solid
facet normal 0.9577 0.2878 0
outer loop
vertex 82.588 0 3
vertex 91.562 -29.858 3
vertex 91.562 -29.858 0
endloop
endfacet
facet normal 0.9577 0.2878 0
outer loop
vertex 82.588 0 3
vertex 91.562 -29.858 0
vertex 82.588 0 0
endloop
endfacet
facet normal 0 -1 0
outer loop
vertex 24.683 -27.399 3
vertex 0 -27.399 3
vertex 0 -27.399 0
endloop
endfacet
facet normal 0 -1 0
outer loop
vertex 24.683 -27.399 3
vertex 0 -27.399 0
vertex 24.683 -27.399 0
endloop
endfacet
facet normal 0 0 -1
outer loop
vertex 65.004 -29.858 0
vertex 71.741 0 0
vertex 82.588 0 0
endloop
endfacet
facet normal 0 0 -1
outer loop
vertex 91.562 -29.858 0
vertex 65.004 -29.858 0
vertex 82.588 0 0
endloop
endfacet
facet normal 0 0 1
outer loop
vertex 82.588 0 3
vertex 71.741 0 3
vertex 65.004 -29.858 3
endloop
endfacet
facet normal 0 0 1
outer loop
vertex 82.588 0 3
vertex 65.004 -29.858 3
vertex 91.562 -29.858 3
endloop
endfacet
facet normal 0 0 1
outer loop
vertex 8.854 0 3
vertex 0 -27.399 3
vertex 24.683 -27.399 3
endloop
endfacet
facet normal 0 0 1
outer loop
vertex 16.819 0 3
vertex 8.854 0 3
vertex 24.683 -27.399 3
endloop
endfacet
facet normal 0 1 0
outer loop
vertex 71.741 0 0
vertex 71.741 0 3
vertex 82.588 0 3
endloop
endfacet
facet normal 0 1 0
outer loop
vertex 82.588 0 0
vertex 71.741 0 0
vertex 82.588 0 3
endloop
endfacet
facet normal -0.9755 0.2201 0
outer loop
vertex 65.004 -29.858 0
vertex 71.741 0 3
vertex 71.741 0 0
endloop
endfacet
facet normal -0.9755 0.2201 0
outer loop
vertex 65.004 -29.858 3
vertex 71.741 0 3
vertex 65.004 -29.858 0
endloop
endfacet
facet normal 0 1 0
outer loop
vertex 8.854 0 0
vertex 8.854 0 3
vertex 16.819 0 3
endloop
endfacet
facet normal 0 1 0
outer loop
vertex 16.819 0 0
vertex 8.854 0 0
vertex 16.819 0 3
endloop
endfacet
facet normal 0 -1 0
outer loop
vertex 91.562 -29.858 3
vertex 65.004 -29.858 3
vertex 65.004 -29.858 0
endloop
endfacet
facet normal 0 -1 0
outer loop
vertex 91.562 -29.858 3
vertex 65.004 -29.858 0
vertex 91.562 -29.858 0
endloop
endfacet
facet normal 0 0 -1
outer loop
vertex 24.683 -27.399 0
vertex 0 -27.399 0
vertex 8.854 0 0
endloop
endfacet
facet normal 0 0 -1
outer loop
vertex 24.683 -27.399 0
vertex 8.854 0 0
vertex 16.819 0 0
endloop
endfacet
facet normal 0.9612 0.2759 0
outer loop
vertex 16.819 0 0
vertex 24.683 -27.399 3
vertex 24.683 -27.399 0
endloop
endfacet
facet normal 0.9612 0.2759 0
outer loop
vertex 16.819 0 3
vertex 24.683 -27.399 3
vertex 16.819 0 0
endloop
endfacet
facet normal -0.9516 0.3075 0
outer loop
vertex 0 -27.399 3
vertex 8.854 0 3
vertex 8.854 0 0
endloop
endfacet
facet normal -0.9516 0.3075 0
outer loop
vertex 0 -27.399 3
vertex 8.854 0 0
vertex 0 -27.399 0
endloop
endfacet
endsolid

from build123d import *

# Parameters (mm, degrees)
F1_W      = 100
F1_H      = 150
F2_DEPTH  = 3
F4_DEPTH  = 3
F6_DEPTH  = 3
F7_DEPTH  = 184.7764700651
F3_W      = 100
F3_H      = 150
F10_DEPTH = 25
F11_DEPTH = 170.0117439032


# Not quite as in the source:
# - a feature names something its author has since deleted; it is built from what else it names


with BuildPart() as f2:
    # F1 (on face) → F2 (new body)
    with BuildSketch(Plane.XY):
        with Locations((50, 75)):
            Rectangle(F1_W, F1_H)
    extrude(amount=F2_DEPTH)

    # F3 (on face) → F4 (join)
    with BuildSketch(Plane.XY.offset(3)):
        Polygon((38.5150648654, 247.4973201752), (0, 150), (100, 150), align=None)
    extrude(amount=-F4_DEPTH)

    # F5 (on face) → F6 (join)
    with BuildSketch(Plane.XY.offset(3)):
        Polygon((16.8190859258, 0), (8.8544115424, 0), (0, -27.3990668356), (24.6833004057, -27.3990668356), align=None)
        Polygon((82.5879052281, 0), (71.7410296202, 0), (65.0041550398, -29.8579074442), (91.5617346764, -29.8579074442), align=None)
    extrude(amount=-F6_DEPTH)

    # F5 (on face) → F7 (cut)
    with BuildSketch(Plane.XY.offset(3)):
        Polygon((0, 0), (8.8544115424, 0), (16.8190859258, 0), (71.7410296202, 0), (82.5879052281, 0), (100, 0), (100, 150), (38.5150648654, 247.4973201752), (0, 150), align=None)
    extrude(amount=-F7_DEPTH, mode=Mode.SUBTRACT)

    # F3 (on face) → F10 (cut)
    with BuildSketch(Plane.XY.offset(3)):
        with Locations((50, 75)):
            Rectangle(F3_W, F3_H)
    extrude(amount=-F10_DEPTH, mode=Mode.SUBTRACT)

    # F9 (on face) → F11 (cut)
    with BuildSketch(Plane.XY.offset(3)):
        with BuildLine():
            ThreePointArc((71.7517411709, 31.0983583331), (74.2517411709, 28.5983583331), (76.7517411709, 31.0983583331))
            Line((76.7517411709, 31.0983583331), (76.7517411709, 76.4879286289))
            ThreePointArc((76.7517411709, 76.4879286289), (74.2517411709, 78.9879286289), (71.7517411709, 76.4879286289))
            Line((71.7517411709, 76.4879286289), (71.7517411709, 31.0983583331))
        make_face()
    extrude(amount=-F11_DEPTH, mode=Mode.SUBTRACT)


solid = f2.part
